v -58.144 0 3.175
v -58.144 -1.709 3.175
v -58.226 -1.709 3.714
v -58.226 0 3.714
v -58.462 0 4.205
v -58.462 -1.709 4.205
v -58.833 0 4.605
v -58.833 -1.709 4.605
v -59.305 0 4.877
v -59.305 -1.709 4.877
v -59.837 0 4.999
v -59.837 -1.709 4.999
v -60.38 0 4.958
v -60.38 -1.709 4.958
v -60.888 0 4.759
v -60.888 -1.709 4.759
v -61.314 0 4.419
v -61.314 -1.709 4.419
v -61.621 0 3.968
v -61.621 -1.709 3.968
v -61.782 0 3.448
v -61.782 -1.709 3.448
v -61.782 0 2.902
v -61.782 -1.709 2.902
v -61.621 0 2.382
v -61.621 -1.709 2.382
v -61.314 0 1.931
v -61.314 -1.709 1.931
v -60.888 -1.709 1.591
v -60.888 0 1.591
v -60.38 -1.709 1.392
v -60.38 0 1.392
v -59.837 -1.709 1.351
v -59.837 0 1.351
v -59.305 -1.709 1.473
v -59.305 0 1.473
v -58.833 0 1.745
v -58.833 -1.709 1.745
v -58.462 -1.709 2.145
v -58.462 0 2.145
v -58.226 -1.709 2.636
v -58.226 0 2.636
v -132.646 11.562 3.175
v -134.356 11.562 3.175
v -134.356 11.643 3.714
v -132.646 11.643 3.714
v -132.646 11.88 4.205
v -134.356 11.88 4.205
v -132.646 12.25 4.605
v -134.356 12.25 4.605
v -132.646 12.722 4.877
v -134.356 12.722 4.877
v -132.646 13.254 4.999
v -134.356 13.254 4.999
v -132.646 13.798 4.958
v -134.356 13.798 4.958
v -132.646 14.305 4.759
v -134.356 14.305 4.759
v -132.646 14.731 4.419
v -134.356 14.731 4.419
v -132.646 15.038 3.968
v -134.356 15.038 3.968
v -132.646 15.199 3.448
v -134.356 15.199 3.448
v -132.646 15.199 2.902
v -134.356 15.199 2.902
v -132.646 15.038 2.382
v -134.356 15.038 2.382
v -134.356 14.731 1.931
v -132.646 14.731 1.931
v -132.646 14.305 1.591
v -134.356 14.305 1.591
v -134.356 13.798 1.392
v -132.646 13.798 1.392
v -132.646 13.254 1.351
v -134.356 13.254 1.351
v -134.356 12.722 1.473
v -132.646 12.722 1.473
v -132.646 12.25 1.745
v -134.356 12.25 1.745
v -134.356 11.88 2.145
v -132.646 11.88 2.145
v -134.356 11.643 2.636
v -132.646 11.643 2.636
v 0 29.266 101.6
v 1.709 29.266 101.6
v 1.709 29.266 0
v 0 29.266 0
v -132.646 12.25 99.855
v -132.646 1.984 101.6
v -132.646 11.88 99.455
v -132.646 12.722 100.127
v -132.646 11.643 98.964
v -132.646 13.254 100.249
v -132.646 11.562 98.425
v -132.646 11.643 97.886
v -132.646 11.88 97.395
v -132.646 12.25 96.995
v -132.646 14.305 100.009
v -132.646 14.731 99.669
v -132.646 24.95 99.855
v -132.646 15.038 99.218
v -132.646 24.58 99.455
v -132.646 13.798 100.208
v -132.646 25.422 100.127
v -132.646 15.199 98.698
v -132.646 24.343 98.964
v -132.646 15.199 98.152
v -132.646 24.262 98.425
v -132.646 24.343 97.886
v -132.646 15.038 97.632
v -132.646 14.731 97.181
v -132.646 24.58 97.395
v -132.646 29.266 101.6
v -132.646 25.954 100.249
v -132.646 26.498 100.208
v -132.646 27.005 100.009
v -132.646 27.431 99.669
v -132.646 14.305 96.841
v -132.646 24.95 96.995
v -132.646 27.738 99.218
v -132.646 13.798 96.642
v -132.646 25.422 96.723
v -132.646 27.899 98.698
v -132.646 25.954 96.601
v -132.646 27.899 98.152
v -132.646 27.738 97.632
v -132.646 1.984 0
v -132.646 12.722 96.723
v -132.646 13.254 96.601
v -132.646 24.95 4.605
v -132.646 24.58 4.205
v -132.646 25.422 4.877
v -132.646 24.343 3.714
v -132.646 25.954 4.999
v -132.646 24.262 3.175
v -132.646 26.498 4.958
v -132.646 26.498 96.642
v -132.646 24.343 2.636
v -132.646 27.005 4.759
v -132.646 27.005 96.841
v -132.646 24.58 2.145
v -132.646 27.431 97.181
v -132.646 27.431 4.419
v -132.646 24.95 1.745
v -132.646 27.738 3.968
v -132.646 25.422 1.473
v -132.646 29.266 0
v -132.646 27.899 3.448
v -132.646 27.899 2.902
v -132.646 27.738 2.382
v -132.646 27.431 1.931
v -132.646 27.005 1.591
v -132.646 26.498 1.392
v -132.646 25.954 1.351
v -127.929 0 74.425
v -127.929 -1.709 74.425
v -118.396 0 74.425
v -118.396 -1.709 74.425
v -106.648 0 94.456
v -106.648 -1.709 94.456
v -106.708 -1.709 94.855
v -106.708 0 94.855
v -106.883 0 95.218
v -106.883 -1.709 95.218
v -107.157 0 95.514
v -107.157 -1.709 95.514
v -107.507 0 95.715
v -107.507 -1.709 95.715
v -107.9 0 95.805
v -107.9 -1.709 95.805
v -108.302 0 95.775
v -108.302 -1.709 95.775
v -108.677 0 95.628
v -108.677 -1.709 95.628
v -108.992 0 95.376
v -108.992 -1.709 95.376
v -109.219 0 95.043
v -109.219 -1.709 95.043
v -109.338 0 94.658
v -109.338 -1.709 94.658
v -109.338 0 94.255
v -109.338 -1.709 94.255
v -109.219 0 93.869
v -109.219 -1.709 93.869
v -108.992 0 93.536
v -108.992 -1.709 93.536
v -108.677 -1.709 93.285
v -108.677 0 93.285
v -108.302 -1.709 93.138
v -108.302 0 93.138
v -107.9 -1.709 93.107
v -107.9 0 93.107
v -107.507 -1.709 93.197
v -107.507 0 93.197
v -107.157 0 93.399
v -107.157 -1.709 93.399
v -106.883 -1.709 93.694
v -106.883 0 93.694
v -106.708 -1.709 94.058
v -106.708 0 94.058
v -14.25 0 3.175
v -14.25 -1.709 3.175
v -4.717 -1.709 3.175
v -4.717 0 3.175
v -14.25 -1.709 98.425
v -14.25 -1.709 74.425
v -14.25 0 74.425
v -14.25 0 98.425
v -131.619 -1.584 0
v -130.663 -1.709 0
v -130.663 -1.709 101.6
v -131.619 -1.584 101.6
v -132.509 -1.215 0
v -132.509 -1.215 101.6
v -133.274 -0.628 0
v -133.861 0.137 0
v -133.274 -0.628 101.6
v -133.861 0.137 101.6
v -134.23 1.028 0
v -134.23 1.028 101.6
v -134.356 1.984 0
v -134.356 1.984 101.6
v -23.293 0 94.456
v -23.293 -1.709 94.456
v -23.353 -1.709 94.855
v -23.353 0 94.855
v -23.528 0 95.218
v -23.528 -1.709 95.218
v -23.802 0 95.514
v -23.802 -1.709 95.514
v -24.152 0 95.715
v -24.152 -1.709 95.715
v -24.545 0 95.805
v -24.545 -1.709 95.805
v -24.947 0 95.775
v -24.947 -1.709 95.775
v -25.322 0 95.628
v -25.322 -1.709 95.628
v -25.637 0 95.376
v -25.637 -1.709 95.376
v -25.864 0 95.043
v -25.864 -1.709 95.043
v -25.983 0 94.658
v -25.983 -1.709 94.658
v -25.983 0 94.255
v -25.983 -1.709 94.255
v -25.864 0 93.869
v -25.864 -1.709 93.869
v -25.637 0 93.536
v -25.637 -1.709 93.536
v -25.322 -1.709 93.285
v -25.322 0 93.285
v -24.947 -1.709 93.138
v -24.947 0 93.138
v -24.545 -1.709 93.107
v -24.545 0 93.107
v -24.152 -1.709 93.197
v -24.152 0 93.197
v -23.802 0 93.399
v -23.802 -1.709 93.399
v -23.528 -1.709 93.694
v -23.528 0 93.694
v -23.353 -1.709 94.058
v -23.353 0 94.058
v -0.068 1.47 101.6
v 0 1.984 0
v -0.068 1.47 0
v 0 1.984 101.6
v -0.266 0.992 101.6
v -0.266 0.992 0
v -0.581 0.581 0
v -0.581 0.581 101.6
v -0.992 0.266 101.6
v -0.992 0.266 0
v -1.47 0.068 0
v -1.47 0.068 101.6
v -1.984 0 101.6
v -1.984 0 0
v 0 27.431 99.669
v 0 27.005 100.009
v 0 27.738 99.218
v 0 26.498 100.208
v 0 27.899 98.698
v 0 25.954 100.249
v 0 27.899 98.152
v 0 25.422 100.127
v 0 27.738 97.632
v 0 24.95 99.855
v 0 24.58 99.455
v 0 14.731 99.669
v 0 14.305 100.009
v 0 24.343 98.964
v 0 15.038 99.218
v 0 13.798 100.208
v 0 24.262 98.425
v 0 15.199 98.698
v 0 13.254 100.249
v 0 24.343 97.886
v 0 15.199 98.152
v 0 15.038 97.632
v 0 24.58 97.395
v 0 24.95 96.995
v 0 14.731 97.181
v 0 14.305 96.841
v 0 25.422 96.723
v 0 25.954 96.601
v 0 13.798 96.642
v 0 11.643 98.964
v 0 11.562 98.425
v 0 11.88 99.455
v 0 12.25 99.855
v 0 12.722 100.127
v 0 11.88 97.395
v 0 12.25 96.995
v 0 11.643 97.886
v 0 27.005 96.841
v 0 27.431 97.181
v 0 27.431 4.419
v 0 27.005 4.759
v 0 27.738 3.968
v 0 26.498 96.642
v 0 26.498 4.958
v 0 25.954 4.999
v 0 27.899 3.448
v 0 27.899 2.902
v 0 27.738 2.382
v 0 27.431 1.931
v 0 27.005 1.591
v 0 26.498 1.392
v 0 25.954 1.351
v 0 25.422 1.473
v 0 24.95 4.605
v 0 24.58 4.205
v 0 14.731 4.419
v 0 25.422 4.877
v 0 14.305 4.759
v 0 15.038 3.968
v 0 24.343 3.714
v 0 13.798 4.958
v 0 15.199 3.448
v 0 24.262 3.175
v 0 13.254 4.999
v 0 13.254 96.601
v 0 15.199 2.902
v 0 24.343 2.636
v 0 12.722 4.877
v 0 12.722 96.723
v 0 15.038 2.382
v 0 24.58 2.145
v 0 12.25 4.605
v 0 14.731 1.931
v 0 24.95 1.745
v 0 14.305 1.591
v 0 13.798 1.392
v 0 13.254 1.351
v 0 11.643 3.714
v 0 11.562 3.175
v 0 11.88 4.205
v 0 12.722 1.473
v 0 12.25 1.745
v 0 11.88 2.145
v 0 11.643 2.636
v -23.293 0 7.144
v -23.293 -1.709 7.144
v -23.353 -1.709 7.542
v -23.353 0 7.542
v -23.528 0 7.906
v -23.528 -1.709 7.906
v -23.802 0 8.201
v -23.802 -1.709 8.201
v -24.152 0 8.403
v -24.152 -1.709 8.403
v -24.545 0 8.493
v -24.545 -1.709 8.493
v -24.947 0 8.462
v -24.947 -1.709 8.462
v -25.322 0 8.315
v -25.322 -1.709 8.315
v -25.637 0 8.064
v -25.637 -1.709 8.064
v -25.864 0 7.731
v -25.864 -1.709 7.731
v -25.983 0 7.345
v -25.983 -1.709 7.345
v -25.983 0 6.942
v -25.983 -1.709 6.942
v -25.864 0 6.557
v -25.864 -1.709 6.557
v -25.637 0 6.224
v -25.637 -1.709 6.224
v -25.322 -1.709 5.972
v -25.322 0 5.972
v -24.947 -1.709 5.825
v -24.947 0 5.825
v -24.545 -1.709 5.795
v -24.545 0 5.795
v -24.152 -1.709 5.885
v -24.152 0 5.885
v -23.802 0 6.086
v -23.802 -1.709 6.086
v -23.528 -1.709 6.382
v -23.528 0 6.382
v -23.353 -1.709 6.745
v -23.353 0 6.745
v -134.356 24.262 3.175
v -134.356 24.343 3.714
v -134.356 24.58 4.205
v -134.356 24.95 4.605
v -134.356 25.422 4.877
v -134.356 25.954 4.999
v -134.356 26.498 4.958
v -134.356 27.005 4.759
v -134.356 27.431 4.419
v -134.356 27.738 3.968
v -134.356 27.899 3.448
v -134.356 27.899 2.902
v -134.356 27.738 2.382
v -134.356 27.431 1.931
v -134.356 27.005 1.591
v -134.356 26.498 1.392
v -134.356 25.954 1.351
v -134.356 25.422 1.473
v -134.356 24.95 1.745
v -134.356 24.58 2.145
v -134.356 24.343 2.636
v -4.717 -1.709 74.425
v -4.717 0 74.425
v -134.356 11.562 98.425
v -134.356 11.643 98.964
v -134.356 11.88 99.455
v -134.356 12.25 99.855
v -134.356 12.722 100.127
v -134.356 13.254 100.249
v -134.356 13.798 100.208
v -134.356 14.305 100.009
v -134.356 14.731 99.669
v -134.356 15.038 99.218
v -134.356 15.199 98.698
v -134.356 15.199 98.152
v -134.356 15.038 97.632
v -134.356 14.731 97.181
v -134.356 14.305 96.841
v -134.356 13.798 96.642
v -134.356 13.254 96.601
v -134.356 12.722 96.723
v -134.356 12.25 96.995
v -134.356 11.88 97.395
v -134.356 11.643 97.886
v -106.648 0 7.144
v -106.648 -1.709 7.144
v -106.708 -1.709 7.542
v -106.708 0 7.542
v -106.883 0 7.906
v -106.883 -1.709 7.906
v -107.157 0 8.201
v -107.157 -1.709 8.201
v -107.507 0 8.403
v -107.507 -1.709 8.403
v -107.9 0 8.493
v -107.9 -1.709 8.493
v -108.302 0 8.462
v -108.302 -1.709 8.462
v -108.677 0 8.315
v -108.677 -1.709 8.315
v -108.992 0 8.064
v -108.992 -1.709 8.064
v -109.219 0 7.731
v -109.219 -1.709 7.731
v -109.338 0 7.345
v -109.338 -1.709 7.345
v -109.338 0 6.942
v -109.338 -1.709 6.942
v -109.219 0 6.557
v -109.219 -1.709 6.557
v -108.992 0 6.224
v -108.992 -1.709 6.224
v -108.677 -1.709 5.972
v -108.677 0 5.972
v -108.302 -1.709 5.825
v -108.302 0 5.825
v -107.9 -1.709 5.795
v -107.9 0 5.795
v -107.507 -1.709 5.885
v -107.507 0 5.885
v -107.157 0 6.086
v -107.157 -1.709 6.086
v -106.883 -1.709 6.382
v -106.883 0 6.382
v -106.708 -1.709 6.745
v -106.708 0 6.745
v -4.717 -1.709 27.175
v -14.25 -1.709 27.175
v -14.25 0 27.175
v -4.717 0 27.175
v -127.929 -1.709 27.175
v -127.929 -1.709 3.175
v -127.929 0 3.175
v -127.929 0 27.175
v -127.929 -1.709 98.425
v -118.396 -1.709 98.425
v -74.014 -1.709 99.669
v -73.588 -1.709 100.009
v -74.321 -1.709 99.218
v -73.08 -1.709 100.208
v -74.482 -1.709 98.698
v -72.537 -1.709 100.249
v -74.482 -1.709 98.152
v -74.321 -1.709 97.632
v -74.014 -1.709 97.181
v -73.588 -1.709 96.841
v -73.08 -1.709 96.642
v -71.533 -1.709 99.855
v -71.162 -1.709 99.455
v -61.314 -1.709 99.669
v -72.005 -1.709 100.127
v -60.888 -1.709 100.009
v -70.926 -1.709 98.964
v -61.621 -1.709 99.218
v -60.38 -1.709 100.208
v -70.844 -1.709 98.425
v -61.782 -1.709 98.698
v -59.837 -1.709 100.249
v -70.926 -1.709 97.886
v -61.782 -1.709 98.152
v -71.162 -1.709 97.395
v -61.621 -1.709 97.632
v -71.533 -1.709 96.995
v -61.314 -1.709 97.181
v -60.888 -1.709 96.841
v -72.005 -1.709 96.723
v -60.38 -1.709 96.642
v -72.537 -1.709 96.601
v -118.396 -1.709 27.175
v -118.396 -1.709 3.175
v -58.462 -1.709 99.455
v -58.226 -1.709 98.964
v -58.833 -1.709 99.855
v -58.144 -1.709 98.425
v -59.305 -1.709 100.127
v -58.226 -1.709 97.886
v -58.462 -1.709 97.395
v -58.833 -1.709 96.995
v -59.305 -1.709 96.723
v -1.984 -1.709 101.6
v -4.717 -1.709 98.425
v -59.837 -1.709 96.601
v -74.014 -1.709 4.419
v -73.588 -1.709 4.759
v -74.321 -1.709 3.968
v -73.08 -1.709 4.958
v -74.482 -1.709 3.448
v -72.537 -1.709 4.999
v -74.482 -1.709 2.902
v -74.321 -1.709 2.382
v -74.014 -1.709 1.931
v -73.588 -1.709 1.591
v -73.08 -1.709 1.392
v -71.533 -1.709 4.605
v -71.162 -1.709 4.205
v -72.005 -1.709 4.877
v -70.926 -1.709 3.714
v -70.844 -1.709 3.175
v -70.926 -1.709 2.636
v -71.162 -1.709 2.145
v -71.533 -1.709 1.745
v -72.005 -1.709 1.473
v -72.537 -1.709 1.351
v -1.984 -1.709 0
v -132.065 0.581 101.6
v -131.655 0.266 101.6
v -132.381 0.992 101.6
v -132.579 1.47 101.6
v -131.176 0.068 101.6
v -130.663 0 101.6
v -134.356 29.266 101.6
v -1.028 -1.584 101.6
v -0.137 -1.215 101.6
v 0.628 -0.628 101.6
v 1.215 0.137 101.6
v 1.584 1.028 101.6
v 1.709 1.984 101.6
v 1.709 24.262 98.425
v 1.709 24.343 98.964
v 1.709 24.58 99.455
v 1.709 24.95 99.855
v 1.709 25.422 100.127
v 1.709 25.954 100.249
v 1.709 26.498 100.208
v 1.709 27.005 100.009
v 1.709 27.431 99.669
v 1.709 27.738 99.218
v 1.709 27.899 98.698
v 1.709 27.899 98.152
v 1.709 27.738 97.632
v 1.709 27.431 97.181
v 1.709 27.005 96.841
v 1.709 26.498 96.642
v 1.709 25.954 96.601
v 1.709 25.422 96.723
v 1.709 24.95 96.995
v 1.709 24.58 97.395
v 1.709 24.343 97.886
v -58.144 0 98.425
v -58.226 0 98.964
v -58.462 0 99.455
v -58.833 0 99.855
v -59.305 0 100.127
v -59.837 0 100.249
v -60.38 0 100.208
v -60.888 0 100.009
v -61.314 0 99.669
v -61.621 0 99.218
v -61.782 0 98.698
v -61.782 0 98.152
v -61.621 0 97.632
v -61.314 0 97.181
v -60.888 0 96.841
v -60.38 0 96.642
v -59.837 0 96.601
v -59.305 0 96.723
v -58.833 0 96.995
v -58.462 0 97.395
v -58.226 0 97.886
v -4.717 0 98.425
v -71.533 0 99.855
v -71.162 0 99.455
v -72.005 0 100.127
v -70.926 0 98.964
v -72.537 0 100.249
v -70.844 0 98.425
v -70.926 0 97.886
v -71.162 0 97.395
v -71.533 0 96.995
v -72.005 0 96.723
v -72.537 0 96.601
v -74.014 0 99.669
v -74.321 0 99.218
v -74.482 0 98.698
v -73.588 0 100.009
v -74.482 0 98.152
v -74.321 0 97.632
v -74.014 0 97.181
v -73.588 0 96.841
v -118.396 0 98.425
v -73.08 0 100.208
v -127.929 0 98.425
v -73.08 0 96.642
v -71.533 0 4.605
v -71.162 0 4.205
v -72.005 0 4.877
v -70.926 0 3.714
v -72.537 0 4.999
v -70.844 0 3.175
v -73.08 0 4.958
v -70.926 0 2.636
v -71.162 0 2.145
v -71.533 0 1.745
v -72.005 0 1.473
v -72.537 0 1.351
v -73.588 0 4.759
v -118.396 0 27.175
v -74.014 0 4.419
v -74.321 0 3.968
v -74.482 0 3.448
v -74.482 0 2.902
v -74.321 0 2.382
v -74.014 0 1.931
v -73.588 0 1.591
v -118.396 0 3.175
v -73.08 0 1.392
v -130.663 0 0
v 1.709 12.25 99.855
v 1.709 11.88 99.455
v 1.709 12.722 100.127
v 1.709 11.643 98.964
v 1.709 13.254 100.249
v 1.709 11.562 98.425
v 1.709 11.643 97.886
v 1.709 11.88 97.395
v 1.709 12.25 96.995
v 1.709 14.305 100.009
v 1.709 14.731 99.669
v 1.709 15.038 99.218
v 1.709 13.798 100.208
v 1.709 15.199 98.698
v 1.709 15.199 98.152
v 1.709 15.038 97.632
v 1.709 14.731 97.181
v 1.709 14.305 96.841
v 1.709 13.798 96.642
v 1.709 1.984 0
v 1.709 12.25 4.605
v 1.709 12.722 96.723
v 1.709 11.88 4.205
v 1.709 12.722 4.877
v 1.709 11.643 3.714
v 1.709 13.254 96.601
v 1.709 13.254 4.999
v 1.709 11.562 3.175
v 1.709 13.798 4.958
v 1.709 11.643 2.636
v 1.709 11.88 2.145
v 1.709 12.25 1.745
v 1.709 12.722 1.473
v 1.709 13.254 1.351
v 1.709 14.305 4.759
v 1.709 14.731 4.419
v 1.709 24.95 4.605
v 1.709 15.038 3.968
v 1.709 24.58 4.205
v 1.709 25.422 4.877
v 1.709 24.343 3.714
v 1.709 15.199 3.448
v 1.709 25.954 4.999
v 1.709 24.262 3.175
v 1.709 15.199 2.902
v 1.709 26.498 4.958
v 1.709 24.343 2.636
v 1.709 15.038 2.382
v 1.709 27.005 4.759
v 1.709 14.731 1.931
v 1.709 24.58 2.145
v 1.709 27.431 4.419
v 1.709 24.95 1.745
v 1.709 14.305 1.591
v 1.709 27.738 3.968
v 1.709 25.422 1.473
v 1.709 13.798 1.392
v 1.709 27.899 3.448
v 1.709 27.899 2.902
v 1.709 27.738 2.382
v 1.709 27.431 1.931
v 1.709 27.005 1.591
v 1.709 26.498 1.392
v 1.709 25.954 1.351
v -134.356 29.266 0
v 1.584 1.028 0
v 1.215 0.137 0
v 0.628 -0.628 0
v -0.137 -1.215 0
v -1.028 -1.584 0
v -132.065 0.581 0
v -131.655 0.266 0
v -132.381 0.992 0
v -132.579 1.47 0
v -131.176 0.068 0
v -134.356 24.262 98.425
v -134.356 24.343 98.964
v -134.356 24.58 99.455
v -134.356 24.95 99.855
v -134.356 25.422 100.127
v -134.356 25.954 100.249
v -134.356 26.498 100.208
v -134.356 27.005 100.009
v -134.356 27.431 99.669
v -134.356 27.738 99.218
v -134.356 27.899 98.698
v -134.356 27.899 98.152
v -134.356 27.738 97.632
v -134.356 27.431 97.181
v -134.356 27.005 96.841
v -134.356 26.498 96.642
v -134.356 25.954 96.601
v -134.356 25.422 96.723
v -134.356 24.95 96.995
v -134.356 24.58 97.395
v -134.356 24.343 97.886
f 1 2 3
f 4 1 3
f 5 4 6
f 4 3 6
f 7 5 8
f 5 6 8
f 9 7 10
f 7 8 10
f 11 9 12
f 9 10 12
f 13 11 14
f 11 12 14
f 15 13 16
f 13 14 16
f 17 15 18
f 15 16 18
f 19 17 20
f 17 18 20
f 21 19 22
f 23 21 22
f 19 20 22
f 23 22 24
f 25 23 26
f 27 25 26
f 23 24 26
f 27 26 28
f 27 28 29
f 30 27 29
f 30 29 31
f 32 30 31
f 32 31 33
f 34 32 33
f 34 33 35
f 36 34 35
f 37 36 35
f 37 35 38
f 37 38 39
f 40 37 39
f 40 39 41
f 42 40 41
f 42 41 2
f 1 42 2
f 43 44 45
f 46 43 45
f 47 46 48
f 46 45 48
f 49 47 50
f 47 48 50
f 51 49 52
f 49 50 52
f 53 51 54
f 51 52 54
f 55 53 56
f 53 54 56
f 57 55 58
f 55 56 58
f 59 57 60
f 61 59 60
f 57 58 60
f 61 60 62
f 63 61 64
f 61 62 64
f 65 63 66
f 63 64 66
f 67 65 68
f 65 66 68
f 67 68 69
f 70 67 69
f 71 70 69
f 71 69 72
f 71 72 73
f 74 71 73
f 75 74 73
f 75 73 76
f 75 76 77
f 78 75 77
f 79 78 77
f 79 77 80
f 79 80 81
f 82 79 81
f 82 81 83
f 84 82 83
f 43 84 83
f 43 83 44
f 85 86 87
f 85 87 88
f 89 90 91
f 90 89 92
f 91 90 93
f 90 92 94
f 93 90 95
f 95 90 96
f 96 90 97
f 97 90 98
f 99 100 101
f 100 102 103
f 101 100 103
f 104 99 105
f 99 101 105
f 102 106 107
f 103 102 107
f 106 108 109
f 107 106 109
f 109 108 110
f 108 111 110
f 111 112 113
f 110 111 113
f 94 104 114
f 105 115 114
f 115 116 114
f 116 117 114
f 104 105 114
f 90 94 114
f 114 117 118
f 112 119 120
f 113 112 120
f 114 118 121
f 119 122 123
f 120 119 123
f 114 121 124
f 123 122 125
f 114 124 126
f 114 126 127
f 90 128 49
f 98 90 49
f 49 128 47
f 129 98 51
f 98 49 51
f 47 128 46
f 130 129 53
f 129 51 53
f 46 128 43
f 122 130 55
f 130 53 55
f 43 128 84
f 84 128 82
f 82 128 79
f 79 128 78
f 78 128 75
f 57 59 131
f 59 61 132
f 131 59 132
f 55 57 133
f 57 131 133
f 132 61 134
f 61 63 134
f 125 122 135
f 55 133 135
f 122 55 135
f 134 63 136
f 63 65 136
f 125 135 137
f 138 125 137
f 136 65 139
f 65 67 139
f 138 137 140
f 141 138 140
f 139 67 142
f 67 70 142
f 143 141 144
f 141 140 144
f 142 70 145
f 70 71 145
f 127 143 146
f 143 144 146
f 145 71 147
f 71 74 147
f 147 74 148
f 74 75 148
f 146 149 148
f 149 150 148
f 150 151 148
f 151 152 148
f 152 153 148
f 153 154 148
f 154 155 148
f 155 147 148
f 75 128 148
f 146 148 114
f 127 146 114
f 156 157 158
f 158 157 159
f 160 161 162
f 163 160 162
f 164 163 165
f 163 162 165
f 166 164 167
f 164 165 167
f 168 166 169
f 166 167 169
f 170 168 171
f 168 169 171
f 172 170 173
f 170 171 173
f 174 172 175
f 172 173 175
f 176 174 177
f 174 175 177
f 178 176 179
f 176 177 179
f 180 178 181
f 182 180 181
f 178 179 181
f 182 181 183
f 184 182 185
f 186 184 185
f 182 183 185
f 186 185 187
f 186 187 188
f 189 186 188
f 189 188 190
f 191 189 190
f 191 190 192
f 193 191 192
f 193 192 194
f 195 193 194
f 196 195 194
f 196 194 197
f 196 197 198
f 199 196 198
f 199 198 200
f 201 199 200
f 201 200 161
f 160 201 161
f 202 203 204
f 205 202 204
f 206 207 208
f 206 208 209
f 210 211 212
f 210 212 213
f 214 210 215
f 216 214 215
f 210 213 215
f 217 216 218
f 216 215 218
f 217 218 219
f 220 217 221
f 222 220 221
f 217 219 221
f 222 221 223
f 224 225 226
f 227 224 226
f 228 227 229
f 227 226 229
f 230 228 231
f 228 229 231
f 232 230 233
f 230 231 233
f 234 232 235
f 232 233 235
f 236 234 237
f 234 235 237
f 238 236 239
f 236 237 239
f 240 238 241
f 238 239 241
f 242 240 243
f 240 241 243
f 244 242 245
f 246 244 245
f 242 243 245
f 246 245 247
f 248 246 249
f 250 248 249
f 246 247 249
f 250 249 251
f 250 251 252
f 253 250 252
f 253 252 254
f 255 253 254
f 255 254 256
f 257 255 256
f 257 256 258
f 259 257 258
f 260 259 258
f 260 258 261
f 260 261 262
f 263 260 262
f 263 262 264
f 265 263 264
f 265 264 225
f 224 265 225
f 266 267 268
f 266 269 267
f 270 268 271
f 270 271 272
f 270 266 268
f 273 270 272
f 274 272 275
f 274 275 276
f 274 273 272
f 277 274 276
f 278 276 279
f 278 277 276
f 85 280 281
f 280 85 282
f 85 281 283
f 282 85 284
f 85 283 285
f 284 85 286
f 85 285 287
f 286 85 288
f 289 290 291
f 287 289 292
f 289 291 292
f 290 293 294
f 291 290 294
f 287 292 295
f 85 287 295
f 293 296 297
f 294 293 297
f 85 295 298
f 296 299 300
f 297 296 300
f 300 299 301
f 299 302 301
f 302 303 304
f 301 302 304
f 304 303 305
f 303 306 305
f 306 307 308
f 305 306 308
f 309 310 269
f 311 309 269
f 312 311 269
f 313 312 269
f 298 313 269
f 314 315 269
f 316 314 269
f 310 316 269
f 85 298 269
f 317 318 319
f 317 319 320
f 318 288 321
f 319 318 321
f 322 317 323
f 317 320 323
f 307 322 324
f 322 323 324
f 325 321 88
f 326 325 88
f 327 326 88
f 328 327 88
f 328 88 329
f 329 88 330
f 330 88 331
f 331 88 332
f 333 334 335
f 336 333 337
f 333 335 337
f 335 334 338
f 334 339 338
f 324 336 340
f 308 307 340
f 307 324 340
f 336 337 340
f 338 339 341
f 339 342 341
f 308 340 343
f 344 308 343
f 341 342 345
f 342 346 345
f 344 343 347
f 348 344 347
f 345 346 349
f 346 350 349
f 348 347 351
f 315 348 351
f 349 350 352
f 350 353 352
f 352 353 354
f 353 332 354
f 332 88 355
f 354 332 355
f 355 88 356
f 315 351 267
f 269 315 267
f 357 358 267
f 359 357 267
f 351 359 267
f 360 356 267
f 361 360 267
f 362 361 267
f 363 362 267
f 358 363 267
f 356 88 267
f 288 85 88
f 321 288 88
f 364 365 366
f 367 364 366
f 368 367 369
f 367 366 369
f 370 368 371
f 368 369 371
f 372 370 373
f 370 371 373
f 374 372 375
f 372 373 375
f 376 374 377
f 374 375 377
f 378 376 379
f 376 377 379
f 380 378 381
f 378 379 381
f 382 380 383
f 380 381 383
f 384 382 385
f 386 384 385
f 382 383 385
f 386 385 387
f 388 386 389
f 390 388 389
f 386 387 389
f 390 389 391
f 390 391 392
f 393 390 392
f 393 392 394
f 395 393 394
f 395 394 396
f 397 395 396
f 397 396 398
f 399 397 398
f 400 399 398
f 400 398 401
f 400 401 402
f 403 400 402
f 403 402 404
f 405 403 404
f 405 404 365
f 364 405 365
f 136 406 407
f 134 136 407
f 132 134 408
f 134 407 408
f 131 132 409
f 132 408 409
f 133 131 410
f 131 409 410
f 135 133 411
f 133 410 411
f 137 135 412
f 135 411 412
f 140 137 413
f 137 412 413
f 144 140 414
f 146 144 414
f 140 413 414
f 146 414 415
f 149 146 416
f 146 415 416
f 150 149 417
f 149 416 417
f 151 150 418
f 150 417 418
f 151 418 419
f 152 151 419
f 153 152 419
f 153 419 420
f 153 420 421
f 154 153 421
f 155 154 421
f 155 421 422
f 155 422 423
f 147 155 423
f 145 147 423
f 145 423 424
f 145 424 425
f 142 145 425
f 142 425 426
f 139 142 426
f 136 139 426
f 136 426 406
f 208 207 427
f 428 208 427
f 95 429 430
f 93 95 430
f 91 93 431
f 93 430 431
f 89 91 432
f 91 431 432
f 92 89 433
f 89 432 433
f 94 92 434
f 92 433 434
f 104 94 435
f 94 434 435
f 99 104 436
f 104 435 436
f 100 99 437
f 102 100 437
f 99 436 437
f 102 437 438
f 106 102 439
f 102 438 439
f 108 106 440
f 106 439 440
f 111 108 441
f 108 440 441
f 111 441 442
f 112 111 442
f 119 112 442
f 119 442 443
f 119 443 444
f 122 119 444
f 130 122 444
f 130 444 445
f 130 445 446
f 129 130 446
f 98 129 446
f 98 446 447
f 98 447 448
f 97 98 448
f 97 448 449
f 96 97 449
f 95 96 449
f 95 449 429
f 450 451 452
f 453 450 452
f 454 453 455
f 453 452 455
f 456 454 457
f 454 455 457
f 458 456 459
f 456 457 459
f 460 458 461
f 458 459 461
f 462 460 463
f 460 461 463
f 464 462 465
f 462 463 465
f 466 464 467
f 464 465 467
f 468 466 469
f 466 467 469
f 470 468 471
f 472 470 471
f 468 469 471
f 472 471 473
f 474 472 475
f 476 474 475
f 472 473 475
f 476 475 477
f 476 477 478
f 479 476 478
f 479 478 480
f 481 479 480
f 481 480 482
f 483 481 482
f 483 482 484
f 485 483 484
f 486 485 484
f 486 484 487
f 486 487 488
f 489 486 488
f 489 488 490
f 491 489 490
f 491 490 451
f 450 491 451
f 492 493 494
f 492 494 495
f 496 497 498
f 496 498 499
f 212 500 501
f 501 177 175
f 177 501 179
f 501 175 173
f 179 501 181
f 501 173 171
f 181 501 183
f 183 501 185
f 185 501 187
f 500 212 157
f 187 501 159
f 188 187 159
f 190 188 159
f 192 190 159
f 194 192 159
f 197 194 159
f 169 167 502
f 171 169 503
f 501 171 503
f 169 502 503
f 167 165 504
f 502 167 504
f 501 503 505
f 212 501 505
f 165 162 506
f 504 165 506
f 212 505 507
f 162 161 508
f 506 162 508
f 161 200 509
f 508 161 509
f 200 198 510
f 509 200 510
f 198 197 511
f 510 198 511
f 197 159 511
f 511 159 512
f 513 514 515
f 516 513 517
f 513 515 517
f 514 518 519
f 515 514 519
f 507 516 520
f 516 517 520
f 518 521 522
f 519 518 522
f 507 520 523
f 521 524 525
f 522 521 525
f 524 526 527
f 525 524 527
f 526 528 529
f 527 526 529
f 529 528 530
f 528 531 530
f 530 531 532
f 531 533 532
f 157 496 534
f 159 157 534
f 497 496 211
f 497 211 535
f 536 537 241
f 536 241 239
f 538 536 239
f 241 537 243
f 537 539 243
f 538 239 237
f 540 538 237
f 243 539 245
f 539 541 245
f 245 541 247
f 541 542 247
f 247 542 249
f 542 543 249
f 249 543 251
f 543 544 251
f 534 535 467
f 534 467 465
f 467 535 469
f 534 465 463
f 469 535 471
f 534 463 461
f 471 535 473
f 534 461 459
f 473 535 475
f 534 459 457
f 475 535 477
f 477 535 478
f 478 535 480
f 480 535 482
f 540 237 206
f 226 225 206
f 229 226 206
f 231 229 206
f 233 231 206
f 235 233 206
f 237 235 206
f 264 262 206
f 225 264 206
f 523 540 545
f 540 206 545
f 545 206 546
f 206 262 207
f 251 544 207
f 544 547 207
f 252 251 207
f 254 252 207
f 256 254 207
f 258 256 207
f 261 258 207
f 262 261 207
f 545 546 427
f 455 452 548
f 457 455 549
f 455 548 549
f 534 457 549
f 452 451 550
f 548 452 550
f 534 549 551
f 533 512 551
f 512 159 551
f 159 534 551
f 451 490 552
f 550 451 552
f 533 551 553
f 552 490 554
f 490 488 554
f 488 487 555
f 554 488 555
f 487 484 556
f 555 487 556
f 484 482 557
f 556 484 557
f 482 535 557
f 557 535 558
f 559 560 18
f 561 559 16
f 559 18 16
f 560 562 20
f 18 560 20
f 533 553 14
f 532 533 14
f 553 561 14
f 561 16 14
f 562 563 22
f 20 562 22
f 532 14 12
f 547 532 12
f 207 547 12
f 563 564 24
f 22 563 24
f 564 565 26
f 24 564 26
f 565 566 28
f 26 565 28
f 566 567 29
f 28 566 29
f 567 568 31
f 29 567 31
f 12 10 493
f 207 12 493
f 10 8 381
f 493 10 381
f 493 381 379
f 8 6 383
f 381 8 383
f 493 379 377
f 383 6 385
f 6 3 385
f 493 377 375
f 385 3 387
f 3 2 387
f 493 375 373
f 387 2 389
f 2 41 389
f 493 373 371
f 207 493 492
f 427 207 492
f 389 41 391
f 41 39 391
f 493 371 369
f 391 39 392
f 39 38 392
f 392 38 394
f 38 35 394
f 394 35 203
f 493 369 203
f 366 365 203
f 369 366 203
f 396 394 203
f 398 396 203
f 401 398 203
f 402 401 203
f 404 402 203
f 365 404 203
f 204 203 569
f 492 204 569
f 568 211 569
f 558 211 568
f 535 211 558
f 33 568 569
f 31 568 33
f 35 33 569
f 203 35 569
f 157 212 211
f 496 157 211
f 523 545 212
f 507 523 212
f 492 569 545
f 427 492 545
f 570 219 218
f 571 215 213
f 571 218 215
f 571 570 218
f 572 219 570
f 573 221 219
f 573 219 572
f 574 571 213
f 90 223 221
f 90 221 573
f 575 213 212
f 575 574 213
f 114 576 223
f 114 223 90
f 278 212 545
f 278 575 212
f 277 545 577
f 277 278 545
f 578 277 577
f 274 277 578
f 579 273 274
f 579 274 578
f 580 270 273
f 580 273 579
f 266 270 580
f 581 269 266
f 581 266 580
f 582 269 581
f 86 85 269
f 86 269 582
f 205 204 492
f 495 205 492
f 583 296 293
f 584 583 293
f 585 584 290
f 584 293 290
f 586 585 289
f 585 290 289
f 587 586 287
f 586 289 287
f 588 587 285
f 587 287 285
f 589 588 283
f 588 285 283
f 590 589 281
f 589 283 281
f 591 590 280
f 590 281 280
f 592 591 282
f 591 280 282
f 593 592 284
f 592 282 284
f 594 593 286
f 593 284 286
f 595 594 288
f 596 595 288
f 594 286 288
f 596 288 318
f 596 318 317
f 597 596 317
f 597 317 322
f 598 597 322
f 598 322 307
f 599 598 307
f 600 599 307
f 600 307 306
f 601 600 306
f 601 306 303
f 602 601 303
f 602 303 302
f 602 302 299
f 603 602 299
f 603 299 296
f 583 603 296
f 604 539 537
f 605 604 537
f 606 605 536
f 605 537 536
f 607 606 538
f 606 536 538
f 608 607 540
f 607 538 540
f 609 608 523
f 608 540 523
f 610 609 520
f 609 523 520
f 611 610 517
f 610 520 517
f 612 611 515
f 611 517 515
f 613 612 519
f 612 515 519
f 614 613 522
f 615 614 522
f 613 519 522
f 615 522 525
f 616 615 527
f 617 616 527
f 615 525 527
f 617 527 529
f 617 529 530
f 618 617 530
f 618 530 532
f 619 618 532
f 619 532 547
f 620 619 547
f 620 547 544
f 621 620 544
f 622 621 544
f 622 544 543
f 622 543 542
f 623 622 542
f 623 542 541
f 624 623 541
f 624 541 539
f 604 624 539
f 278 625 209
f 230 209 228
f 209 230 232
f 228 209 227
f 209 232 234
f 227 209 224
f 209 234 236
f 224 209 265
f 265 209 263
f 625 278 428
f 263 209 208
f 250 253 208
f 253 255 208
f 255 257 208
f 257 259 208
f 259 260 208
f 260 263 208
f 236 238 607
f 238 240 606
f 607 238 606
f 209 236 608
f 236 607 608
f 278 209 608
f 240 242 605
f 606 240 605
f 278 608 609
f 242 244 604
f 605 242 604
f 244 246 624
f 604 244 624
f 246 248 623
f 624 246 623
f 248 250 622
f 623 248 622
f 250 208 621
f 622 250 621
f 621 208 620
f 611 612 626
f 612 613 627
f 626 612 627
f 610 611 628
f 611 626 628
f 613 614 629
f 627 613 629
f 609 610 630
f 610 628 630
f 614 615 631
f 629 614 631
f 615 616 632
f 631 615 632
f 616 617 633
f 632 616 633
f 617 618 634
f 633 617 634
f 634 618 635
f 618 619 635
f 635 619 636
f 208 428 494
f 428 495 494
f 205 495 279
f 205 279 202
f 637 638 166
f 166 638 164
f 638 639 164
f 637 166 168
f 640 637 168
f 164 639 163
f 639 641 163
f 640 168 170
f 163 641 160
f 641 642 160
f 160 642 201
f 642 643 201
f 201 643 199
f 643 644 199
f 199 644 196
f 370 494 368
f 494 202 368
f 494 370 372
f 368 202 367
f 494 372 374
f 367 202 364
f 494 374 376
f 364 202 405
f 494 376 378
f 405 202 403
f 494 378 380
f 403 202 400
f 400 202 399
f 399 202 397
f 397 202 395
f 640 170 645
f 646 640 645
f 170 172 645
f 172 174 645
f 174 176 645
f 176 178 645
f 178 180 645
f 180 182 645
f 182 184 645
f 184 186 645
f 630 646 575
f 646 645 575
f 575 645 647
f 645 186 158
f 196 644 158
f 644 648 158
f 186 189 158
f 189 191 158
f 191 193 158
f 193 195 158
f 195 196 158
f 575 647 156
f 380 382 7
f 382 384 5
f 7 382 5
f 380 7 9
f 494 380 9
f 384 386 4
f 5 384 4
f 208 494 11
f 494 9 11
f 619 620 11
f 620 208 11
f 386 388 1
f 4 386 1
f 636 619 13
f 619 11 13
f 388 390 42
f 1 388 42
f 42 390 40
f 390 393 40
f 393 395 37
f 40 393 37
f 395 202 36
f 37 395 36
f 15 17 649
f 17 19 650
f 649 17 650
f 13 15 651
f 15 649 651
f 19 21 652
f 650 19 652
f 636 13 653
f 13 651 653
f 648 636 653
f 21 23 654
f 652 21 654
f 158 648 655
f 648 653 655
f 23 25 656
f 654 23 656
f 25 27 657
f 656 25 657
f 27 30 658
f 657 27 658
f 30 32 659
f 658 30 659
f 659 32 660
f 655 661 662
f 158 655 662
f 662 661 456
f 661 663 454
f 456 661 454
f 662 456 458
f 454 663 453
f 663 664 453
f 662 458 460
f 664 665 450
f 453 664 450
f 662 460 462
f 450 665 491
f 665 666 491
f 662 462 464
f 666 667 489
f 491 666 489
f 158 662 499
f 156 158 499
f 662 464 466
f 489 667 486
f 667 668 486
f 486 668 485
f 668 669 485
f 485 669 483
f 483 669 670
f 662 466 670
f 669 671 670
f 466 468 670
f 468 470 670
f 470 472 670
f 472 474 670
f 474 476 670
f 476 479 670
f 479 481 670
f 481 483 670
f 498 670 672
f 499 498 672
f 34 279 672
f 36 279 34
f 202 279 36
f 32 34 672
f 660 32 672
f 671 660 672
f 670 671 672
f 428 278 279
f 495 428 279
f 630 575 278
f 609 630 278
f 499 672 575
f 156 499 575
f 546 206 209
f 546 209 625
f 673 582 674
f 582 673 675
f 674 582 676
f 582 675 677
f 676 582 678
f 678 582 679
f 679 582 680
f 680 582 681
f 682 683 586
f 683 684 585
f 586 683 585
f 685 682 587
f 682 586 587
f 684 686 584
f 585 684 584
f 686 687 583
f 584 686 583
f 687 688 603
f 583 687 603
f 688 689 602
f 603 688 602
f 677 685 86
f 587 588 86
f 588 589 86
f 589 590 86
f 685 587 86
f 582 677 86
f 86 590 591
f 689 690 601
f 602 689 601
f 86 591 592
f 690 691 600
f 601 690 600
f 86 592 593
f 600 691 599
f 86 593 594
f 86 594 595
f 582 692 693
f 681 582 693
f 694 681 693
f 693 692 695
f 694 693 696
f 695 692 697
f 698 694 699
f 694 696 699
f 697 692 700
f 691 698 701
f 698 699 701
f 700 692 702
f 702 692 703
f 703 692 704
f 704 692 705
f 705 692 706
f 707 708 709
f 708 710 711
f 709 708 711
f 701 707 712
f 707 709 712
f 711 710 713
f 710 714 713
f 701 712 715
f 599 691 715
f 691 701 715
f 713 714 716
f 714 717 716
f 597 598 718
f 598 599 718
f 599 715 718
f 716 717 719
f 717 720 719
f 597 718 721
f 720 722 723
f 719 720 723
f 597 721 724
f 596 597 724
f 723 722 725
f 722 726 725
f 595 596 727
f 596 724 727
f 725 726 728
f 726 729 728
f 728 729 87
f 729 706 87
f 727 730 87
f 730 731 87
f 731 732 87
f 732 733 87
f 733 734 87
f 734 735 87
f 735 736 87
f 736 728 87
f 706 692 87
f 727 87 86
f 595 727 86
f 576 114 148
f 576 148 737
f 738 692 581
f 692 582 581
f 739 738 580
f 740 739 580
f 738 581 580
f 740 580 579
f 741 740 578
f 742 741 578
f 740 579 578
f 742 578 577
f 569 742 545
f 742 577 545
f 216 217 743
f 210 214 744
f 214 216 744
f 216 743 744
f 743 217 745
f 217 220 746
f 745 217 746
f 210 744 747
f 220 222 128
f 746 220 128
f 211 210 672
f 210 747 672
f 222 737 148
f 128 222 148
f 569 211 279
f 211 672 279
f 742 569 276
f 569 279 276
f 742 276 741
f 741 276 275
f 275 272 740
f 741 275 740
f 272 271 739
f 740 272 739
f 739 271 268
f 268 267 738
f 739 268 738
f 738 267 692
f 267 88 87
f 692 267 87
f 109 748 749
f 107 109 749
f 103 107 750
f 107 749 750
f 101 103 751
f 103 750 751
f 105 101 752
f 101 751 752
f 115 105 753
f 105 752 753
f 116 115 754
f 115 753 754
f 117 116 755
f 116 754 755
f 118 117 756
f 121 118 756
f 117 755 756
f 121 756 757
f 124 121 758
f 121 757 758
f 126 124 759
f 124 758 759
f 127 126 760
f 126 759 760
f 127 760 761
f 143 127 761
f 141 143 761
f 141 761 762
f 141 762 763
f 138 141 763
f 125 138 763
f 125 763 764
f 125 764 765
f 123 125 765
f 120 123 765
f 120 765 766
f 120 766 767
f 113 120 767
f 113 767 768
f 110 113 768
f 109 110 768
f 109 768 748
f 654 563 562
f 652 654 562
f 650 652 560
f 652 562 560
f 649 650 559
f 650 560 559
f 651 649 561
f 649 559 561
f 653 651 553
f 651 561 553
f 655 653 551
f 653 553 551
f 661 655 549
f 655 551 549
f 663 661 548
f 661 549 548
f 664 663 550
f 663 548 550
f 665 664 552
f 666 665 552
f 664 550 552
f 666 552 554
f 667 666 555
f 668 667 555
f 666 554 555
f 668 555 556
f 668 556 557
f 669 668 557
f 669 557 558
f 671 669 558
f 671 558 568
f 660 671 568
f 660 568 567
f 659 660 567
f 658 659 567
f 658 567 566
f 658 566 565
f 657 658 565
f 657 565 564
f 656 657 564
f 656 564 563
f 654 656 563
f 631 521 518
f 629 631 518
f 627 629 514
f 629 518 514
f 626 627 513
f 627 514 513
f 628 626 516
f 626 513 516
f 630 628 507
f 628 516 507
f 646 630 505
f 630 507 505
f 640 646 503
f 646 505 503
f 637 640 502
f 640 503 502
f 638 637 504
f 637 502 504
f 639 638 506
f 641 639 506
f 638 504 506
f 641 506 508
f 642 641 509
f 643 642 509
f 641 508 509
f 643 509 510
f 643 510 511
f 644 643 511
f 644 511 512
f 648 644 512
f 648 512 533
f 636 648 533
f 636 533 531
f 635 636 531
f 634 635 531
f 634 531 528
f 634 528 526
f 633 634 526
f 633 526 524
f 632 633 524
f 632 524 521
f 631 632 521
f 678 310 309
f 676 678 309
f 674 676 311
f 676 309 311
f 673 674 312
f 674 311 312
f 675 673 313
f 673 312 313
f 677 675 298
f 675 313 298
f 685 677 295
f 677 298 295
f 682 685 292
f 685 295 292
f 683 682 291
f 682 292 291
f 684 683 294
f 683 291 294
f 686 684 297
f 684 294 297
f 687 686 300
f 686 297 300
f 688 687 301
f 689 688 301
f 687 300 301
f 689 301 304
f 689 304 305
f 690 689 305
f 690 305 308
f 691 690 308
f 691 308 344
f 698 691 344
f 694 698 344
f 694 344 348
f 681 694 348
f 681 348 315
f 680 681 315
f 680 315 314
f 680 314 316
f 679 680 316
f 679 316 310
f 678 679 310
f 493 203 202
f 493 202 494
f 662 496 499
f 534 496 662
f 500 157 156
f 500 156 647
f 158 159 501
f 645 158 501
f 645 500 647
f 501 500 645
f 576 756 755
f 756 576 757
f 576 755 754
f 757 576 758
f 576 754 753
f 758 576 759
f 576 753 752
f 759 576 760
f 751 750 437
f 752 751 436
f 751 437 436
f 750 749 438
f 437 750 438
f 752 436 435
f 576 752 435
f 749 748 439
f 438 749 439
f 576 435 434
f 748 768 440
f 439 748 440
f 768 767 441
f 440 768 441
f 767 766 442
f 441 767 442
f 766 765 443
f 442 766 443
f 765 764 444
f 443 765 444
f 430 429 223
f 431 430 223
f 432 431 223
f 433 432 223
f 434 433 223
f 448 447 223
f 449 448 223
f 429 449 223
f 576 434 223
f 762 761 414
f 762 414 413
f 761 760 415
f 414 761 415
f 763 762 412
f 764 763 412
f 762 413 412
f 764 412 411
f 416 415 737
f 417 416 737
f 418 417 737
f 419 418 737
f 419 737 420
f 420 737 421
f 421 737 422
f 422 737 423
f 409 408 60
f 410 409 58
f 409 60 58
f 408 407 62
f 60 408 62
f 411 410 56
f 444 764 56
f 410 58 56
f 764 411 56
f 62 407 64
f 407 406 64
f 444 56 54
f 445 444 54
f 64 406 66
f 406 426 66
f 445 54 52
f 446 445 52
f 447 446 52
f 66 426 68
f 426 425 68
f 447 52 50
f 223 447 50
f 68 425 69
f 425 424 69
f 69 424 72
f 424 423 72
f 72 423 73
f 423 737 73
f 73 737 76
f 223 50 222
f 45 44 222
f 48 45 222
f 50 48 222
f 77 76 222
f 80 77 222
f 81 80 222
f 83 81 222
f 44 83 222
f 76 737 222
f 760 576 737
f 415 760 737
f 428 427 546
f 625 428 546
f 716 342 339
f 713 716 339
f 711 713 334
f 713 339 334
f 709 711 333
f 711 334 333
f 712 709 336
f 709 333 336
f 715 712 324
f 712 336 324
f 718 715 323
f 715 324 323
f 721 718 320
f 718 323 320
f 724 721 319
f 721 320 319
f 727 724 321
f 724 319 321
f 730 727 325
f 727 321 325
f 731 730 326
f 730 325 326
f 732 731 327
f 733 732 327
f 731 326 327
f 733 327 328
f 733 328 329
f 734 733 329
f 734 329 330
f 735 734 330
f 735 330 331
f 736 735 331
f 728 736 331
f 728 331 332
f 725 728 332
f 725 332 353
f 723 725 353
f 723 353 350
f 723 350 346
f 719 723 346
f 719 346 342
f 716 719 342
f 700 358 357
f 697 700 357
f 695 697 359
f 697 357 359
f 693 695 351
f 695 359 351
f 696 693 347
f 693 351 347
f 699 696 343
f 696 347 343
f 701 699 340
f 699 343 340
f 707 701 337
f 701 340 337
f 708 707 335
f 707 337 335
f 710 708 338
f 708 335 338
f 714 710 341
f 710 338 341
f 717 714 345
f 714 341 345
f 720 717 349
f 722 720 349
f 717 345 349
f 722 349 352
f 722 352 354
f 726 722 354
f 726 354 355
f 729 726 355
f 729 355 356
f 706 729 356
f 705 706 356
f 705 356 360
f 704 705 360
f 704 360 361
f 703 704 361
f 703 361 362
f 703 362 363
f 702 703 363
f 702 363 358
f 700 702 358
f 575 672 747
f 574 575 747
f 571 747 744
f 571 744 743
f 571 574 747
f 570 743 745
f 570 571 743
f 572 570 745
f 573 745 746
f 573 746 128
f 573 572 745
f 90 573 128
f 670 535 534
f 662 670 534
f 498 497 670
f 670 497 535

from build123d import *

# Parameters (mm, degrees)
F1_DEPTH = 101.6
F2_R     = 1.98374
F3_R     = 3.69316
F4_W     = 9.5329248
F4_H     = 24
F4_R     = 1.35255
F4_R_2   = 1.8288
F5_DEPTH = 257
F6_R     = 1.8288
F7_DEPTH = 136.06526


# Not quite as in the source:
# - an extrude ends at something that could not be found from the text; its depth is read off the source's solid


with BuildPart() as f1:
    # F0 (on Top) → F1 (new body)
    with BuildSketch(Plane.XY):
        Polygon((0, 29.2656006), (0, 0), (-132.64642, 0), (-132.64642, 29.2656006), (-134.35584, 29.2656006), (-134.35584, -1.70942), (1.70942, -1.70942), (1.70942, 29.2656006), align=None)
    extrude(amount=F1_DEPTH)

    # F2
    f2_edges = [f1.edges().sort_by_distance(p)[0] for p in [
        (0, 0, 50.8),
        (-132.64642, 0, 50.8),
    ]]
    fillet(f2_edges, radius=F2_R)

    # F3
    f3_edges = [f1.edges().sort_by_distance(p)[0] for p in [
        (-134.35584, -1.70942, 50.8),
        (1.70942, -1.70942, 50.8),
    ]]
    fillet(f3_edges, radius=F3_R)

    # F4 (on face) → F5 (cut, through all)
    with BuildSketch(Plane.XZ.offset(1.70942)):
        with Locations((-9.48374, 15.175)):
            Rectangle(F4_W, F4_H)
        with Locations((-123.16268, 15.175)):
            Rectangle(F4_W, F4_H)
        with Locations((-123.16268, 86.425)):
            Rectangle(F4_W, F4_H)
        with Locations((-9.48374, 86.425)):
            Rectangle(F4_W, F4_H)
        with Locations((-24.6456604, 7.14375)):
            Circle(F4_R)
        with Locations((-108.0007596, 7.14375)):
            Circle(F4_R)
        with Locations((-108.0007596, 94.45625)):
            Circle(F4_R)
        with Locations((-24.6456604, 94.45625)):
            Circle(F4_R)
        with Locations((-59.97321, 3.175)):
            Circle(F4_R_2)
        with Locations((-72.67321, 3.175)):
            Circle(F4_R_2)
        with Locations((-59.97321, 98.425)):
            Circle(F4_R_2)
        with Locations((-72.67321, 98.425)):
            Circle(F4_R_2)
    extrude(amount=-F5_DEPTH, mode=Mode.SUBTRACT)

    # F6 (on face) → F7 (cut, through all)
    with BuildSketch(Plane(origin=(-134.35584, 0, 0), x_dir=(0, -1, 0), z_dir=(-1, 0, 0))):
        with Locations((-26.0906006, 3.175)):
            Circle(F6_R)
        with Locations((-13.3906006, 3.175)):
            Circle(F6_R)
        with Locations((-13.3906006, 98.425)):
            Circle(F6_R)
        with Locations((-26.0906006, 98.425)):
            Circle(F6_R)
    extrude(amount=-F7_DEPTH, mode=Mode.SUBTRACT)


solid = f1.part
